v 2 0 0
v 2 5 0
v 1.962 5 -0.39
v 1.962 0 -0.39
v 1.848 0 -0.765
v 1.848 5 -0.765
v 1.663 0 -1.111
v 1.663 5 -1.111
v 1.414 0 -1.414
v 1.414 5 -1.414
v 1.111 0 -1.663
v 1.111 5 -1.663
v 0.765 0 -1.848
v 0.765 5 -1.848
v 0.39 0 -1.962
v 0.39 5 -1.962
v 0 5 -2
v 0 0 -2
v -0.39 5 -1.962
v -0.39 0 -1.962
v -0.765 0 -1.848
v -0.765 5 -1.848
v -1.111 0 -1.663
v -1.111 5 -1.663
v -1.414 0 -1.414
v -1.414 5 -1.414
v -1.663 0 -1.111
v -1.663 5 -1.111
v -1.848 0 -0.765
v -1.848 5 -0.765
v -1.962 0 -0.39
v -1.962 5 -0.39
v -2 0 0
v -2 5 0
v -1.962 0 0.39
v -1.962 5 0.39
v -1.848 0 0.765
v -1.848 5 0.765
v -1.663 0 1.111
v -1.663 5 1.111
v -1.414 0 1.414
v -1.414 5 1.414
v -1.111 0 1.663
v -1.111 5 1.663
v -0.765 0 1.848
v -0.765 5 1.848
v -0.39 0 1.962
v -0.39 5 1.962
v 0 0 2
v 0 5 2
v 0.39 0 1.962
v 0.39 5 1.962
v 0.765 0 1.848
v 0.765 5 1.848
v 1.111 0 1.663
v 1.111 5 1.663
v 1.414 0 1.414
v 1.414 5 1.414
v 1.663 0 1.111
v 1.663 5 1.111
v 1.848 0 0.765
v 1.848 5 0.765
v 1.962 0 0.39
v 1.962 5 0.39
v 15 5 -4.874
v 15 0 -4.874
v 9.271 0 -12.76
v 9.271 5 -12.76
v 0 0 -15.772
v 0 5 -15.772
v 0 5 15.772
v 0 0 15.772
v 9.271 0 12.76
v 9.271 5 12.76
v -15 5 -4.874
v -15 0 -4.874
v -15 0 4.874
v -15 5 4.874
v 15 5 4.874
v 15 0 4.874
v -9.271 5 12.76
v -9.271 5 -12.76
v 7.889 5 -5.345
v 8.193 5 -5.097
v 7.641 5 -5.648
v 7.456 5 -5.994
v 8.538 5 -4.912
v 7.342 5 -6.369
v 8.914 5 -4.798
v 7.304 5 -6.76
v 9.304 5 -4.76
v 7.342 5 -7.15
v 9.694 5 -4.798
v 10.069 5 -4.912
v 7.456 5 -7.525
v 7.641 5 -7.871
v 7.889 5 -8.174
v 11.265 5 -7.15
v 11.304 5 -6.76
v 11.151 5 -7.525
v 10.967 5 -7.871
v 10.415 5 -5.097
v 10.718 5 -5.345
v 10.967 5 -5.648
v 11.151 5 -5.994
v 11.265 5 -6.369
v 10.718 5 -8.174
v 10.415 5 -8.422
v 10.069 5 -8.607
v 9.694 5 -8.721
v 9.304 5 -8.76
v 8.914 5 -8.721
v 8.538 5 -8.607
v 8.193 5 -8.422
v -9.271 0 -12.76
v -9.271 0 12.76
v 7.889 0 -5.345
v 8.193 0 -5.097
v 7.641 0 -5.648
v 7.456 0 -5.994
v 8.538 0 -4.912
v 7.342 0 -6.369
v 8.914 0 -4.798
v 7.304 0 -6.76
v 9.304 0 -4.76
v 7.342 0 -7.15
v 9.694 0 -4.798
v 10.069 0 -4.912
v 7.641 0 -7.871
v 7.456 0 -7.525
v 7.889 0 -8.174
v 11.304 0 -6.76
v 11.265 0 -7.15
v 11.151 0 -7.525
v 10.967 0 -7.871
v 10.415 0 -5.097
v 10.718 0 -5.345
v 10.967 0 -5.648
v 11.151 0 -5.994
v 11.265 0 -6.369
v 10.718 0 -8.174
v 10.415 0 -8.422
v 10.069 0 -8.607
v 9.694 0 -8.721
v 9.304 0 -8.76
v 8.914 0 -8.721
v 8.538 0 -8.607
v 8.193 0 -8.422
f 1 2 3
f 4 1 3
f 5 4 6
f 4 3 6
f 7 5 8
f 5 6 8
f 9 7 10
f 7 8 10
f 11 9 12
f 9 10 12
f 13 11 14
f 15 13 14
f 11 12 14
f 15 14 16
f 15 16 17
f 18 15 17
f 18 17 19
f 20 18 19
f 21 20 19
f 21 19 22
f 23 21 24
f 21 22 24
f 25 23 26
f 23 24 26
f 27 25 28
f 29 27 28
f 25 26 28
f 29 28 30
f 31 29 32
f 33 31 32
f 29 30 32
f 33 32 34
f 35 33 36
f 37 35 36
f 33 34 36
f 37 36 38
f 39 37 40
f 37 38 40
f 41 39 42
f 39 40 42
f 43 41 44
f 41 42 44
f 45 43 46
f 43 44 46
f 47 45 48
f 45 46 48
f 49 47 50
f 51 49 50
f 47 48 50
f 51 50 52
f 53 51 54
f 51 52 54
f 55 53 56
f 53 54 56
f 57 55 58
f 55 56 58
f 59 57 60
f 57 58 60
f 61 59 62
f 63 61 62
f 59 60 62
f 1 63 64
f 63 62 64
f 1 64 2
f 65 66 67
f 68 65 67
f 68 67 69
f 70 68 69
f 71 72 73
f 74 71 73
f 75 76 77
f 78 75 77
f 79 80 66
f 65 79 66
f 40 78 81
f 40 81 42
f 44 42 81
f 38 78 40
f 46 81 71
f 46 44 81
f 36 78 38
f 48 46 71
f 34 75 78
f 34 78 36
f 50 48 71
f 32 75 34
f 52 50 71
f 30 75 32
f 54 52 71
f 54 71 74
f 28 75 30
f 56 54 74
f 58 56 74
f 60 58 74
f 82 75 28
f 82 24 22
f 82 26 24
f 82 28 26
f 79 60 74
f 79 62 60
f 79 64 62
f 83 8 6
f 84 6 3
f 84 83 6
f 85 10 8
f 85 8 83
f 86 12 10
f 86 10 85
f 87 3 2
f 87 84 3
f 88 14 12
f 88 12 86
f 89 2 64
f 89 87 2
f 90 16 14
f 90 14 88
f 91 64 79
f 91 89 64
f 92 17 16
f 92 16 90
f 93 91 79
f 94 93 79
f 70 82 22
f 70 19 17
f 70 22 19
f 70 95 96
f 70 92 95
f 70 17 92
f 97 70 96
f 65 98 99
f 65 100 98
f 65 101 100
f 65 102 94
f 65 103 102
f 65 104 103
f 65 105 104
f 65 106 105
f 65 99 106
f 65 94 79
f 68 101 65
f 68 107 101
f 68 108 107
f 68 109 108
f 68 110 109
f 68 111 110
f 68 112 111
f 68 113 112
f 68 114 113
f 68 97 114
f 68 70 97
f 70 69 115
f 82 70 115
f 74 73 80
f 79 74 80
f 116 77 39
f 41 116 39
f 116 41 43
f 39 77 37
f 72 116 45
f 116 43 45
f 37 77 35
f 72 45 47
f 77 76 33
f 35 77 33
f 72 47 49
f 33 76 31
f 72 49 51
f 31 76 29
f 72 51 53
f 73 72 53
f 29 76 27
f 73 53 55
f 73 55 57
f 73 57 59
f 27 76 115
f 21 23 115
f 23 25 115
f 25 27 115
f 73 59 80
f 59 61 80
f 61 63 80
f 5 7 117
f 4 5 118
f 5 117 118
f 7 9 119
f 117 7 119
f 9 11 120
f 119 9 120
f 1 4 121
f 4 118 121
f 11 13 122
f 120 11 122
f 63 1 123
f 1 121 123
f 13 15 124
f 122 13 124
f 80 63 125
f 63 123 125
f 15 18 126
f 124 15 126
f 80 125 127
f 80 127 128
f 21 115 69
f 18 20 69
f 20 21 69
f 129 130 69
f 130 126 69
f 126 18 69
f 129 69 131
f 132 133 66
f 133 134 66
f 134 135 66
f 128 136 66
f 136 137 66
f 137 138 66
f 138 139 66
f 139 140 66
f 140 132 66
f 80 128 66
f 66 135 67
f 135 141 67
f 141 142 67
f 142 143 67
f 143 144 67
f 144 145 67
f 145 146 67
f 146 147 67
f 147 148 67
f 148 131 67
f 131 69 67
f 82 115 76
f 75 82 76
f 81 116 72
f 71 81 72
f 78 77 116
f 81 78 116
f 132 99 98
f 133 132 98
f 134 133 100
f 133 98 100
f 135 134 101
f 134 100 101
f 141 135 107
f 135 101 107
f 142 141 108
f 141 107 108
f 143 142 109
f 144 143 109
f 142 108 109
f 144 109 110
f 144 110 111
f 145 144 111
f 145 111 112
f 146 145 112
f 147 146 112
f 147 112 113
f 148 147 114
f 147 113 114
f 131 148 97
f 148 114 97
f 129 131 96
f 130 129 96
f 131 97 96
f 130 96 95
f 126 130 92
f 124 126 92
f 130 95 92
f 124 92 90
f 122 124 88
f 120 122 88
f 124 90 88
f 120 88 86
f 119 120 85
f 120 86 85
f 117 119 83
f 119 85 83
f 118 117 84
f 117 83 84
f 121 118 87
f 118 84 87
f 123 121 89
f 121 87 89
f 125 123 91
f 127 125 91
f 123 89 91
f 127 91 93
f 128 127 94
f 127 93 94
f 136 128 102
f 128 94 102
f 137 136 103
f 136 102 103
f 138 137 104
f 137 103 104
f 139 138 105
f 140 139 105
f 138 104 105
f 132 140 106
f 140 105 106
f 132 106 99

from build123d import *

# Parameters (mm, degrees)
BOSS_EXTRUDE1_DEPTH = 5
SKETCH2_R           = 2
CUT_EXTRUDE1_DEPTH  = 5


with BuildPart() as part:
    # Sketch1 → Boss-Extrude1 (new body)
    with BuildSketch(Plane(origin=(0, 0, 0), x_dir=(1, 0, 0), z_dir=(0, 1, 0))):
        Polygon((9.270509831, -12.759762125), (15, -4.873795443), (15, 4.873795443), (9.270509831, 12.759762125), (0, 15.771933364), (-9.270509831, 12.759762125), (-15, 4.873795443), (-15, -4.873795443), (-9.270509831, -12.759762125), (0, -15.771933364), align=None)
    extrude(amount=BOSS_EXTRUDE1_DEPTH)

    # Sketch2 → Cut-Extrude1 (cut)
    with BuildSketch(Plane(origin=(0, 5, 0), x_dir=(1, 0, 0), z_dir=(0, 1, 0))):
        Circle(SKETCH2_R)
        with Locations((9.303695435, 6.759530401)):
            Circle(SKETCH2_R)
    extrude(amount=-CUT_EXTRUDE1_DEPTH, mode=Mode.SUBTRACT)


solid = part.part
